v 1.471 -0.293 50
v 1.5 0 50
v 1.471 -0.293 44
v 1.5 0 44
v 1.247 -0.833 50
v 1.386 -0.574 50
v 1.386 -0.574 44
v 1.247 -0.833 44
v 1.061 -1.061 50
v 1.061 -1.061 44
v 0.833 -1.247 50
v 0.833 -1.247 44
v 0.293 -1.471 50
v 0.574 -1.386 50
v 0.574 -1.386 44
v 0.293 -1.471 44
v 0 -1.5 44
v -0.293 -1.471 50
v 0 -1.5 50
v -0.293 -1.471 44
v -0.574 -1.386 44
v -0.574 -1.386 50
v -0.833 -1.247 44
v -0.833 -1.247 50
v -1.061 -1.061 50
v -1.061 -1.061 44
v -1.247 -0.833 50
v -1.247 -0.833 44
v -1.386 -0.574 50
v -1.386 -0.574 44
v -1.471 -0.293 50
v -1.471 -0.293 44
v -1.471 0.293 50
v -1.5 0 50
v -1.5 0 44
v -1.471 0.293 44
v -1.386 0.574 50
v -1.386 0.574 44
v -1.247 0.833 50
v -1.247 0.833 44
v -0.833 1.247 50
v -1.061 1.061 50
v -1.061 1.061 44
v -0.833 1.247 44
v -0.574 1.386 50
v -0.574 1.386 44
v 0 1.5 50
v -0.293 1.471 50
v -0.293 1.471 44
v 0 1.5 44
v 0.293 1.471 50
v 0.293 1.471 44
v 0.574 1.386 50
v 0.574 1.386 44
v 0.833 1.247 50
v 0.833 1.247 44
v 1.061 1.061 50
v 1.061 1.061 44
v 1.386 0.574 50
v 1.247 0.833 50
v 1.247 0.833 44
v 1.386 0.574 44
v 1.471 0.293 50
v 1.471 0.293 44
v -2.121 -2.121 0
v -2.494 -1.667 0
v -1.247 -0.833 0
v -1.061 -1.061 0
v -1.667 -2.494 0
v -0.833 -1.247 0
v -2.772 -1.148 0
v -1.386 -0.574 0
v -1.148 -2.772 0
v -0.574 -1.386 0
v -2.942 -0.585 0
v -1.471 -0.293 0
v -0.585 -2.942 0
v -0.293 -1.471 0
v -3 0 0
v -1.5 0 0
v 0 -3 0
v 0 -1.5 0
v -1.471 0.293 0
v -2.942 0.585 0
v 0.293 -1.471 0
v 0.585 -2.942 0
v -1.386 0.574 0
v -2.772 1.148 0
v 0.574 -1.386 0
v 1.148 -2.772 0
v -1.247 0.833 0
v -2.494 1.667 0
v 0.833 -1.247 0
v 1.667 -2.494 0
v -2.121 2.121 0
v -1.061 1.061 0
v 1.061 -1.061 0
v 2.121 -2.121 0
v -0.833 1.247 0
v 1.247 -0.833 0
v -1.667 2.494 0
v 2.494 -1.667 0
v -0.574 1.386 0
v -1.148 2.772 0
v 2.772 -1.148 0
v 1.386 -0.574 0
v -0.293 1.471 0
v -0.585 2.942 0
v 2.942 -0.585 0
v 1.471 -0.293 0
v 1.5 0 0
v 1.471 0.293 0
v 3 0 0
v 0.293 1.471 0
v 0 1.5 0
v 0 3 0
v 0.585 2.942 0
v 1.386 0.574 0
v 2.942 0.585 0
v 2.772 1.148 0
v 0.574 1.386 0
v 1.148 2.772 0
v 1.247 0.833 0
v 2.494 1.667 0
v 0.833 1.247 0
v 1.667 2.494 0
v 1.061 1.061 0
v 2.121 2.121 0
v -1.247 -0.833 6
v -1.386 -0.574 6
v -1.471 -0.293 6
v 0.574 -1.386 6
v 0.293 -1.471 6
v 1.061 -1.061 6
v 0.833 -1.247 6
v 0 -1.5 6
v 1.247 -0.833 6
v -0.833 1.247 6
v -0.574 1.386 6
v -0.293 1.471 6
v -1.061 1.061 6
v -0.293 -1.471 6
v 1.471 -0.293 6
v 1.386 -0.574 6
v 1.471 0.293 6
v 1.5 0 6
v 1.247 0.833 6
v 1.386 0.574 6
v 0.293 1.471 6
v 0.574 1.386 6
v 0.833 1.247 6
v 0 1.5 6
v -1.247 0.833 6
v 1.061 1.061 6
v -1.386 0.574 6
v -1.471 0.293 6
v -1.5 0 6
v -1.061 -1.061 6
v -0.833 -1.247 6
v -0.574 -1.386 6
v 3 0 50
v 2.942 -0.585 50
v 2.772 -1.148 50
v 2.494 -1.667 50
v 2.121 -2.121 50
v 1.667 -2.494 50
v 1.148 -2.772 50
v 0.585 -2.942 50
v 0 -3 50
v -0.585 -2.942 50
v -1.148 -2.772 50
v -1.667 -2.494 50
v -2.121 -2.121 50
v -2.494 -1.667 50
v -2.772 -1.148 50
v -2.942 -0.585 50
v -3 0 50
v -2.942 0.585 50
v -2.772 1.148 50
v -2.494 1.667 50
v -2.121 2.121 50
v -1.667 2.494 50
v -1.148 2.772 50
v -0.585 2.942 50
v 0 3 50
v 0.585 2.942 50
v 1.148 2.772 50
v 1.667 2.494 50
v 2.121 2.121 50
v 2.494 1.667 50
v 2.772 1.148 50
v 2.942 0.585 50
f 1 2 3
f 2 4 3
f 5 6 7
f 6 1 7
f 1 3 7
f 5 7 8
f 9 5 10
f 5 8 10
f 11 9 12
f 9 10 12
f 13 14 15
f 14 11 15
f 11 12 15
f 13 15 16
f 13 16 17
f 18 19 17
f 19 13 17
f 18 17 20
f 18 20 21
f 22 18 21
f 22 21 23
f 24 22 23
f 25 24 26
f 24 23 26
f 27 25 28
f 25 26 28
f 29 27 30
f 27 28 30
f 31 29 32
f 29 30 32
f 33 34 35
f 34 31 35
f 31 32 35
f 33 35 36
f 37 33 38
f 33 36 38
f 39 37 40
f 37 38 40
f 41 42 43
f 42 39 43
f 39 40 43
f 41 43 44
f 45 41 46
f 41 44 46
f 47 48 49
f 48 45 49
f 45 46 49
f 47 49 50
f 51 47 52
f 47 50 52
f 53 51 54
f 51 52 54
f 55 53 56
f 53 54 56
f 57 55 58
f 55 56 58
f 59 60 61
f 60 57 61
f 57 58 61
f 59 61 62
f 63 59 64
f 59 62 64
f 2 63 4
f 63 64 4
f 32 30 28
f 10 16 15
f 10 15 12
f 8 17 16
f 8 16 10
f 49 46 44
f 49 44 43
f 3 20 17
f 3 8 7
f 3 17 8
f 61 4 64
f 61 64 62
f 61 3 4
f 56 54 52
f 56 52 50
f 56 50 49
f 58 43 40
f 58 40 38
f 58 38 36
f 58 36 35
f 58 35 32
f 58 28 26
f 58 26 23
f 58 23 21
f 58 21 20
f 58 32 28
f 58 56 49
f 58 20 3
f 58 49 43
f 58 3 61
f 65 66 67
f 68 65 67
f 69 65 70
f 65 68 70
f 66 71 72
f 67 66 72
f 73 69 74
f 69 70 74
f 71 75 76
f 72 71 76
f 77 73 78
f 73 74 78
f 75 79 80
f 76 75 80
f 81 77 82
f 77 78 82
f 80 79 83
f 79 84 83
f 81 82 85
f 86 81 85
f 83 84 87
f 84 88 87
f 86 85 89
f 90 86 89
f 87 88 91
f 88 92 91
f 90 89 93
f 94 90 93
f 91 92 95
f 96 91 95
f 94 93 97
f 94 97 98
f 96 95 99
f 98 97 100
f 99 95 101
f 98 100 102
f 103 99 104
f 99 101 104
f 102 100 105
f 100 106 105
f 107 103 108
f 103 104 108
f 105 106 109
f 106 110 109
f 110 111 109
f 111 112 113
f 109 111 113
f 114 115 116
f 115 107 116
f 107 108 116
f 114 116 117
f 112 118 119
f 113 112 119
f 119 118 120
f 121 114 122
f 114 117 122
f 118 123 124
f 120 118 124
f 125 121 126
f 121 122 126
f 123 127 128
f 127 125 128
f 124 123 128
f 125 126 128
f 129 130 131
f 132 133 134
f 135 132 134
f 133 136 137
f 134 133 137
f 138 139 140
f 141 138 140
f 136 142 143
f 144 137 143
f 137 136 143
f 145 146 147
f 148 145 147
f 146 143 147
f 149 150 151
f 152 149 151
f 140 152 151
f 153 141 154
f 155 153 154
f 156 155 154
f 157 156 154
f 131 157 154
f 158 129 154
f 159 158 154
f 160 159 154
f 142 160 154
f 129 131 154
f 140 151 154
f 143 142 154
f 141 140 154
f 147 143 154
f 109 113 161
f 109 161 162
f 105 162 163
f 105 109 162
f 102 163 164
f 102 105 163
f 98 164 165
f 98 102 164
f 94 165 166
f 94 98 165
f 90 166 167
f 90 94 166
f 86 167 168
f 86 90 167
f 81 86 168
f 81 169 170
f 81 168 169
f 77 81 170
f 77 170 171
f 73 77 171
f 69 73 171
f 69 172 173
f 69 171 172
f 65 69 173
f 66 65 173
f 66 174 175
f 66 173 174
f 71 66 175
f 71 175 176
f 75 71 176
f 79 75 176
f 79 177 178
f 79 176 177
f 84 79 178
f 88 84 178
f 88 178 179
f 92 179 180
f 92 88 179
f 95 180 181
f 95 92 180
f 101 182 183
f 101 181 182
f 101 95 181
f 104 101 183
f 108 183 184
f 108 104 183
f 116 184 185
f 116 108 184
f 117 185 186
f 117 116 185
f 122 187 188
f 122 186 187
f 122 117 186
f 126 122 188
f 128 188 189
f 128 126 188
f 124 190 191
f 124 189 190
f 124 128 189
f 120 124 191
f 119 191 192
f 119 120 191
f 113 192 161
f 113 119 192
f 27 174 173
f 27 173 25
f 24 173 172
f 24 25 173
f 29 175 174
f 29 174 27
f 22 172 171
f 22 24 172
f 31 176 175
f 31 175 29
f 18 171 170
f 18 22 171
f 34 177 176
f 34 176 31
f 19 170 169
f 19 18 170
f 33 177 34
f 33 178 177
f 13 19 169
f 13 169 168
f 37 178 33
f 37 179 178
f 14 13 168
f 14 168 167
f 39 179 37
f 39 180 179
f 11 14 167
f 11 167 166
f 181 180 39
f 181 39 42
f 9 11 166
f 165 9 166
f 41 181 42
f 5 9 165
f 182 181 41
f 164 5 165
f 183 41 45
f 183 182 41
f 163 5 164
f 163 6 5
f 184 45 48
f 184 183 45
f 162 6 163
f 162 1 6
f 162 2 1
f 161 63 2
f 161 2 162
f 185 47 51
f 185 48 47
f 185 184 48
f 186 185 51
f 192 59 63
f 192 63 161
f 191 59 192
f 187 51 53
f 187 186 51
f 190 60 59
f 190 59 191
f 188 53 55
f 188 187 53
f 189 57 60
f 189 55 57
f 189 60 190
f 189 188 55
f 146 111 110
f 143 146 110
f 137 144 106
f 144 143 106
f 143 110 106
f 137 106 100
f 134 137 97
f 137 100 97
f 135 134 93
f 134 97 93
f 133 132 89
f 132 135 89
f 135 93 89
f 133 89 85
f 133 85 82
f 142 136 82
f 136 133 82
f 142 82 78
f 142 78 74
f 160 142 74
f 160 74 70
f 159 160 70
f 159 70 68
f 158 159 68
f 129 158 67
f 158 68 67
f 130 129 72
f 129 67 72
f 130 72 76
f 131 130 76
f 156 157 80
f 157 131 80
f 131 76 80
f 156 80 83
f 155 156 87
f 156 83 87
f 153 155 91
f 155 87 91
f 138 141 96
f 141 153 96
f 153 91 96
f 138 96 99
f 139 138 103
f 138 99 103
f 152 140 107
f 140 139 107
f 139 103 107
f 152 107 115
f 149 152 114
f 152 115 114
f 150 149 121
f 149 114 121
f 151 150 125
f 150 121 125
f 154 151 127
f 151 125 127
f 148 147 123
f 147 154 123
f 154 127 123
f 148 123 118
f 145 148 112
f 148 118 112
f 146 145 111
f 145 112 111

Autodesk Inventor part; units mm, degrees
ref_plane "YZ Plane" through (0, 0, 0) normal (1, 0, 0) x (0, 1, 0)
ref_plane "XZ Plane" through (0, 0, 0) normal (0, 1, 0) x (-1, 0, 0)
sketch "スケッチ1" plane through (0, 0, 0) normal (0, 0, 1) x (1, 0, 0)
  circle A0 centre (0, 0) radius 1.5
  circle A1 centre (0, 0) radius 3
  dimension "d0" = 3
  dimension "d1" = 6
extrude "押し出し1" add sketch "スケッチ1" along normal blind 50
ref_plane "作業平面1" through (0, 0, 44) normal (0, 0, 1) x (1, 0, 0)
sketch "スケッチ3" plane through (0, 0, 44) normal (0, 0, 1) x (1, 0, 0)
  circle A0 centre (0, 0) radius 1.5 projected
extrude "押し出し3" add sketch "スケッチ3" against normal blind 38
properties part number "スペーサーm3,50" material "アルミニウム 7075"
